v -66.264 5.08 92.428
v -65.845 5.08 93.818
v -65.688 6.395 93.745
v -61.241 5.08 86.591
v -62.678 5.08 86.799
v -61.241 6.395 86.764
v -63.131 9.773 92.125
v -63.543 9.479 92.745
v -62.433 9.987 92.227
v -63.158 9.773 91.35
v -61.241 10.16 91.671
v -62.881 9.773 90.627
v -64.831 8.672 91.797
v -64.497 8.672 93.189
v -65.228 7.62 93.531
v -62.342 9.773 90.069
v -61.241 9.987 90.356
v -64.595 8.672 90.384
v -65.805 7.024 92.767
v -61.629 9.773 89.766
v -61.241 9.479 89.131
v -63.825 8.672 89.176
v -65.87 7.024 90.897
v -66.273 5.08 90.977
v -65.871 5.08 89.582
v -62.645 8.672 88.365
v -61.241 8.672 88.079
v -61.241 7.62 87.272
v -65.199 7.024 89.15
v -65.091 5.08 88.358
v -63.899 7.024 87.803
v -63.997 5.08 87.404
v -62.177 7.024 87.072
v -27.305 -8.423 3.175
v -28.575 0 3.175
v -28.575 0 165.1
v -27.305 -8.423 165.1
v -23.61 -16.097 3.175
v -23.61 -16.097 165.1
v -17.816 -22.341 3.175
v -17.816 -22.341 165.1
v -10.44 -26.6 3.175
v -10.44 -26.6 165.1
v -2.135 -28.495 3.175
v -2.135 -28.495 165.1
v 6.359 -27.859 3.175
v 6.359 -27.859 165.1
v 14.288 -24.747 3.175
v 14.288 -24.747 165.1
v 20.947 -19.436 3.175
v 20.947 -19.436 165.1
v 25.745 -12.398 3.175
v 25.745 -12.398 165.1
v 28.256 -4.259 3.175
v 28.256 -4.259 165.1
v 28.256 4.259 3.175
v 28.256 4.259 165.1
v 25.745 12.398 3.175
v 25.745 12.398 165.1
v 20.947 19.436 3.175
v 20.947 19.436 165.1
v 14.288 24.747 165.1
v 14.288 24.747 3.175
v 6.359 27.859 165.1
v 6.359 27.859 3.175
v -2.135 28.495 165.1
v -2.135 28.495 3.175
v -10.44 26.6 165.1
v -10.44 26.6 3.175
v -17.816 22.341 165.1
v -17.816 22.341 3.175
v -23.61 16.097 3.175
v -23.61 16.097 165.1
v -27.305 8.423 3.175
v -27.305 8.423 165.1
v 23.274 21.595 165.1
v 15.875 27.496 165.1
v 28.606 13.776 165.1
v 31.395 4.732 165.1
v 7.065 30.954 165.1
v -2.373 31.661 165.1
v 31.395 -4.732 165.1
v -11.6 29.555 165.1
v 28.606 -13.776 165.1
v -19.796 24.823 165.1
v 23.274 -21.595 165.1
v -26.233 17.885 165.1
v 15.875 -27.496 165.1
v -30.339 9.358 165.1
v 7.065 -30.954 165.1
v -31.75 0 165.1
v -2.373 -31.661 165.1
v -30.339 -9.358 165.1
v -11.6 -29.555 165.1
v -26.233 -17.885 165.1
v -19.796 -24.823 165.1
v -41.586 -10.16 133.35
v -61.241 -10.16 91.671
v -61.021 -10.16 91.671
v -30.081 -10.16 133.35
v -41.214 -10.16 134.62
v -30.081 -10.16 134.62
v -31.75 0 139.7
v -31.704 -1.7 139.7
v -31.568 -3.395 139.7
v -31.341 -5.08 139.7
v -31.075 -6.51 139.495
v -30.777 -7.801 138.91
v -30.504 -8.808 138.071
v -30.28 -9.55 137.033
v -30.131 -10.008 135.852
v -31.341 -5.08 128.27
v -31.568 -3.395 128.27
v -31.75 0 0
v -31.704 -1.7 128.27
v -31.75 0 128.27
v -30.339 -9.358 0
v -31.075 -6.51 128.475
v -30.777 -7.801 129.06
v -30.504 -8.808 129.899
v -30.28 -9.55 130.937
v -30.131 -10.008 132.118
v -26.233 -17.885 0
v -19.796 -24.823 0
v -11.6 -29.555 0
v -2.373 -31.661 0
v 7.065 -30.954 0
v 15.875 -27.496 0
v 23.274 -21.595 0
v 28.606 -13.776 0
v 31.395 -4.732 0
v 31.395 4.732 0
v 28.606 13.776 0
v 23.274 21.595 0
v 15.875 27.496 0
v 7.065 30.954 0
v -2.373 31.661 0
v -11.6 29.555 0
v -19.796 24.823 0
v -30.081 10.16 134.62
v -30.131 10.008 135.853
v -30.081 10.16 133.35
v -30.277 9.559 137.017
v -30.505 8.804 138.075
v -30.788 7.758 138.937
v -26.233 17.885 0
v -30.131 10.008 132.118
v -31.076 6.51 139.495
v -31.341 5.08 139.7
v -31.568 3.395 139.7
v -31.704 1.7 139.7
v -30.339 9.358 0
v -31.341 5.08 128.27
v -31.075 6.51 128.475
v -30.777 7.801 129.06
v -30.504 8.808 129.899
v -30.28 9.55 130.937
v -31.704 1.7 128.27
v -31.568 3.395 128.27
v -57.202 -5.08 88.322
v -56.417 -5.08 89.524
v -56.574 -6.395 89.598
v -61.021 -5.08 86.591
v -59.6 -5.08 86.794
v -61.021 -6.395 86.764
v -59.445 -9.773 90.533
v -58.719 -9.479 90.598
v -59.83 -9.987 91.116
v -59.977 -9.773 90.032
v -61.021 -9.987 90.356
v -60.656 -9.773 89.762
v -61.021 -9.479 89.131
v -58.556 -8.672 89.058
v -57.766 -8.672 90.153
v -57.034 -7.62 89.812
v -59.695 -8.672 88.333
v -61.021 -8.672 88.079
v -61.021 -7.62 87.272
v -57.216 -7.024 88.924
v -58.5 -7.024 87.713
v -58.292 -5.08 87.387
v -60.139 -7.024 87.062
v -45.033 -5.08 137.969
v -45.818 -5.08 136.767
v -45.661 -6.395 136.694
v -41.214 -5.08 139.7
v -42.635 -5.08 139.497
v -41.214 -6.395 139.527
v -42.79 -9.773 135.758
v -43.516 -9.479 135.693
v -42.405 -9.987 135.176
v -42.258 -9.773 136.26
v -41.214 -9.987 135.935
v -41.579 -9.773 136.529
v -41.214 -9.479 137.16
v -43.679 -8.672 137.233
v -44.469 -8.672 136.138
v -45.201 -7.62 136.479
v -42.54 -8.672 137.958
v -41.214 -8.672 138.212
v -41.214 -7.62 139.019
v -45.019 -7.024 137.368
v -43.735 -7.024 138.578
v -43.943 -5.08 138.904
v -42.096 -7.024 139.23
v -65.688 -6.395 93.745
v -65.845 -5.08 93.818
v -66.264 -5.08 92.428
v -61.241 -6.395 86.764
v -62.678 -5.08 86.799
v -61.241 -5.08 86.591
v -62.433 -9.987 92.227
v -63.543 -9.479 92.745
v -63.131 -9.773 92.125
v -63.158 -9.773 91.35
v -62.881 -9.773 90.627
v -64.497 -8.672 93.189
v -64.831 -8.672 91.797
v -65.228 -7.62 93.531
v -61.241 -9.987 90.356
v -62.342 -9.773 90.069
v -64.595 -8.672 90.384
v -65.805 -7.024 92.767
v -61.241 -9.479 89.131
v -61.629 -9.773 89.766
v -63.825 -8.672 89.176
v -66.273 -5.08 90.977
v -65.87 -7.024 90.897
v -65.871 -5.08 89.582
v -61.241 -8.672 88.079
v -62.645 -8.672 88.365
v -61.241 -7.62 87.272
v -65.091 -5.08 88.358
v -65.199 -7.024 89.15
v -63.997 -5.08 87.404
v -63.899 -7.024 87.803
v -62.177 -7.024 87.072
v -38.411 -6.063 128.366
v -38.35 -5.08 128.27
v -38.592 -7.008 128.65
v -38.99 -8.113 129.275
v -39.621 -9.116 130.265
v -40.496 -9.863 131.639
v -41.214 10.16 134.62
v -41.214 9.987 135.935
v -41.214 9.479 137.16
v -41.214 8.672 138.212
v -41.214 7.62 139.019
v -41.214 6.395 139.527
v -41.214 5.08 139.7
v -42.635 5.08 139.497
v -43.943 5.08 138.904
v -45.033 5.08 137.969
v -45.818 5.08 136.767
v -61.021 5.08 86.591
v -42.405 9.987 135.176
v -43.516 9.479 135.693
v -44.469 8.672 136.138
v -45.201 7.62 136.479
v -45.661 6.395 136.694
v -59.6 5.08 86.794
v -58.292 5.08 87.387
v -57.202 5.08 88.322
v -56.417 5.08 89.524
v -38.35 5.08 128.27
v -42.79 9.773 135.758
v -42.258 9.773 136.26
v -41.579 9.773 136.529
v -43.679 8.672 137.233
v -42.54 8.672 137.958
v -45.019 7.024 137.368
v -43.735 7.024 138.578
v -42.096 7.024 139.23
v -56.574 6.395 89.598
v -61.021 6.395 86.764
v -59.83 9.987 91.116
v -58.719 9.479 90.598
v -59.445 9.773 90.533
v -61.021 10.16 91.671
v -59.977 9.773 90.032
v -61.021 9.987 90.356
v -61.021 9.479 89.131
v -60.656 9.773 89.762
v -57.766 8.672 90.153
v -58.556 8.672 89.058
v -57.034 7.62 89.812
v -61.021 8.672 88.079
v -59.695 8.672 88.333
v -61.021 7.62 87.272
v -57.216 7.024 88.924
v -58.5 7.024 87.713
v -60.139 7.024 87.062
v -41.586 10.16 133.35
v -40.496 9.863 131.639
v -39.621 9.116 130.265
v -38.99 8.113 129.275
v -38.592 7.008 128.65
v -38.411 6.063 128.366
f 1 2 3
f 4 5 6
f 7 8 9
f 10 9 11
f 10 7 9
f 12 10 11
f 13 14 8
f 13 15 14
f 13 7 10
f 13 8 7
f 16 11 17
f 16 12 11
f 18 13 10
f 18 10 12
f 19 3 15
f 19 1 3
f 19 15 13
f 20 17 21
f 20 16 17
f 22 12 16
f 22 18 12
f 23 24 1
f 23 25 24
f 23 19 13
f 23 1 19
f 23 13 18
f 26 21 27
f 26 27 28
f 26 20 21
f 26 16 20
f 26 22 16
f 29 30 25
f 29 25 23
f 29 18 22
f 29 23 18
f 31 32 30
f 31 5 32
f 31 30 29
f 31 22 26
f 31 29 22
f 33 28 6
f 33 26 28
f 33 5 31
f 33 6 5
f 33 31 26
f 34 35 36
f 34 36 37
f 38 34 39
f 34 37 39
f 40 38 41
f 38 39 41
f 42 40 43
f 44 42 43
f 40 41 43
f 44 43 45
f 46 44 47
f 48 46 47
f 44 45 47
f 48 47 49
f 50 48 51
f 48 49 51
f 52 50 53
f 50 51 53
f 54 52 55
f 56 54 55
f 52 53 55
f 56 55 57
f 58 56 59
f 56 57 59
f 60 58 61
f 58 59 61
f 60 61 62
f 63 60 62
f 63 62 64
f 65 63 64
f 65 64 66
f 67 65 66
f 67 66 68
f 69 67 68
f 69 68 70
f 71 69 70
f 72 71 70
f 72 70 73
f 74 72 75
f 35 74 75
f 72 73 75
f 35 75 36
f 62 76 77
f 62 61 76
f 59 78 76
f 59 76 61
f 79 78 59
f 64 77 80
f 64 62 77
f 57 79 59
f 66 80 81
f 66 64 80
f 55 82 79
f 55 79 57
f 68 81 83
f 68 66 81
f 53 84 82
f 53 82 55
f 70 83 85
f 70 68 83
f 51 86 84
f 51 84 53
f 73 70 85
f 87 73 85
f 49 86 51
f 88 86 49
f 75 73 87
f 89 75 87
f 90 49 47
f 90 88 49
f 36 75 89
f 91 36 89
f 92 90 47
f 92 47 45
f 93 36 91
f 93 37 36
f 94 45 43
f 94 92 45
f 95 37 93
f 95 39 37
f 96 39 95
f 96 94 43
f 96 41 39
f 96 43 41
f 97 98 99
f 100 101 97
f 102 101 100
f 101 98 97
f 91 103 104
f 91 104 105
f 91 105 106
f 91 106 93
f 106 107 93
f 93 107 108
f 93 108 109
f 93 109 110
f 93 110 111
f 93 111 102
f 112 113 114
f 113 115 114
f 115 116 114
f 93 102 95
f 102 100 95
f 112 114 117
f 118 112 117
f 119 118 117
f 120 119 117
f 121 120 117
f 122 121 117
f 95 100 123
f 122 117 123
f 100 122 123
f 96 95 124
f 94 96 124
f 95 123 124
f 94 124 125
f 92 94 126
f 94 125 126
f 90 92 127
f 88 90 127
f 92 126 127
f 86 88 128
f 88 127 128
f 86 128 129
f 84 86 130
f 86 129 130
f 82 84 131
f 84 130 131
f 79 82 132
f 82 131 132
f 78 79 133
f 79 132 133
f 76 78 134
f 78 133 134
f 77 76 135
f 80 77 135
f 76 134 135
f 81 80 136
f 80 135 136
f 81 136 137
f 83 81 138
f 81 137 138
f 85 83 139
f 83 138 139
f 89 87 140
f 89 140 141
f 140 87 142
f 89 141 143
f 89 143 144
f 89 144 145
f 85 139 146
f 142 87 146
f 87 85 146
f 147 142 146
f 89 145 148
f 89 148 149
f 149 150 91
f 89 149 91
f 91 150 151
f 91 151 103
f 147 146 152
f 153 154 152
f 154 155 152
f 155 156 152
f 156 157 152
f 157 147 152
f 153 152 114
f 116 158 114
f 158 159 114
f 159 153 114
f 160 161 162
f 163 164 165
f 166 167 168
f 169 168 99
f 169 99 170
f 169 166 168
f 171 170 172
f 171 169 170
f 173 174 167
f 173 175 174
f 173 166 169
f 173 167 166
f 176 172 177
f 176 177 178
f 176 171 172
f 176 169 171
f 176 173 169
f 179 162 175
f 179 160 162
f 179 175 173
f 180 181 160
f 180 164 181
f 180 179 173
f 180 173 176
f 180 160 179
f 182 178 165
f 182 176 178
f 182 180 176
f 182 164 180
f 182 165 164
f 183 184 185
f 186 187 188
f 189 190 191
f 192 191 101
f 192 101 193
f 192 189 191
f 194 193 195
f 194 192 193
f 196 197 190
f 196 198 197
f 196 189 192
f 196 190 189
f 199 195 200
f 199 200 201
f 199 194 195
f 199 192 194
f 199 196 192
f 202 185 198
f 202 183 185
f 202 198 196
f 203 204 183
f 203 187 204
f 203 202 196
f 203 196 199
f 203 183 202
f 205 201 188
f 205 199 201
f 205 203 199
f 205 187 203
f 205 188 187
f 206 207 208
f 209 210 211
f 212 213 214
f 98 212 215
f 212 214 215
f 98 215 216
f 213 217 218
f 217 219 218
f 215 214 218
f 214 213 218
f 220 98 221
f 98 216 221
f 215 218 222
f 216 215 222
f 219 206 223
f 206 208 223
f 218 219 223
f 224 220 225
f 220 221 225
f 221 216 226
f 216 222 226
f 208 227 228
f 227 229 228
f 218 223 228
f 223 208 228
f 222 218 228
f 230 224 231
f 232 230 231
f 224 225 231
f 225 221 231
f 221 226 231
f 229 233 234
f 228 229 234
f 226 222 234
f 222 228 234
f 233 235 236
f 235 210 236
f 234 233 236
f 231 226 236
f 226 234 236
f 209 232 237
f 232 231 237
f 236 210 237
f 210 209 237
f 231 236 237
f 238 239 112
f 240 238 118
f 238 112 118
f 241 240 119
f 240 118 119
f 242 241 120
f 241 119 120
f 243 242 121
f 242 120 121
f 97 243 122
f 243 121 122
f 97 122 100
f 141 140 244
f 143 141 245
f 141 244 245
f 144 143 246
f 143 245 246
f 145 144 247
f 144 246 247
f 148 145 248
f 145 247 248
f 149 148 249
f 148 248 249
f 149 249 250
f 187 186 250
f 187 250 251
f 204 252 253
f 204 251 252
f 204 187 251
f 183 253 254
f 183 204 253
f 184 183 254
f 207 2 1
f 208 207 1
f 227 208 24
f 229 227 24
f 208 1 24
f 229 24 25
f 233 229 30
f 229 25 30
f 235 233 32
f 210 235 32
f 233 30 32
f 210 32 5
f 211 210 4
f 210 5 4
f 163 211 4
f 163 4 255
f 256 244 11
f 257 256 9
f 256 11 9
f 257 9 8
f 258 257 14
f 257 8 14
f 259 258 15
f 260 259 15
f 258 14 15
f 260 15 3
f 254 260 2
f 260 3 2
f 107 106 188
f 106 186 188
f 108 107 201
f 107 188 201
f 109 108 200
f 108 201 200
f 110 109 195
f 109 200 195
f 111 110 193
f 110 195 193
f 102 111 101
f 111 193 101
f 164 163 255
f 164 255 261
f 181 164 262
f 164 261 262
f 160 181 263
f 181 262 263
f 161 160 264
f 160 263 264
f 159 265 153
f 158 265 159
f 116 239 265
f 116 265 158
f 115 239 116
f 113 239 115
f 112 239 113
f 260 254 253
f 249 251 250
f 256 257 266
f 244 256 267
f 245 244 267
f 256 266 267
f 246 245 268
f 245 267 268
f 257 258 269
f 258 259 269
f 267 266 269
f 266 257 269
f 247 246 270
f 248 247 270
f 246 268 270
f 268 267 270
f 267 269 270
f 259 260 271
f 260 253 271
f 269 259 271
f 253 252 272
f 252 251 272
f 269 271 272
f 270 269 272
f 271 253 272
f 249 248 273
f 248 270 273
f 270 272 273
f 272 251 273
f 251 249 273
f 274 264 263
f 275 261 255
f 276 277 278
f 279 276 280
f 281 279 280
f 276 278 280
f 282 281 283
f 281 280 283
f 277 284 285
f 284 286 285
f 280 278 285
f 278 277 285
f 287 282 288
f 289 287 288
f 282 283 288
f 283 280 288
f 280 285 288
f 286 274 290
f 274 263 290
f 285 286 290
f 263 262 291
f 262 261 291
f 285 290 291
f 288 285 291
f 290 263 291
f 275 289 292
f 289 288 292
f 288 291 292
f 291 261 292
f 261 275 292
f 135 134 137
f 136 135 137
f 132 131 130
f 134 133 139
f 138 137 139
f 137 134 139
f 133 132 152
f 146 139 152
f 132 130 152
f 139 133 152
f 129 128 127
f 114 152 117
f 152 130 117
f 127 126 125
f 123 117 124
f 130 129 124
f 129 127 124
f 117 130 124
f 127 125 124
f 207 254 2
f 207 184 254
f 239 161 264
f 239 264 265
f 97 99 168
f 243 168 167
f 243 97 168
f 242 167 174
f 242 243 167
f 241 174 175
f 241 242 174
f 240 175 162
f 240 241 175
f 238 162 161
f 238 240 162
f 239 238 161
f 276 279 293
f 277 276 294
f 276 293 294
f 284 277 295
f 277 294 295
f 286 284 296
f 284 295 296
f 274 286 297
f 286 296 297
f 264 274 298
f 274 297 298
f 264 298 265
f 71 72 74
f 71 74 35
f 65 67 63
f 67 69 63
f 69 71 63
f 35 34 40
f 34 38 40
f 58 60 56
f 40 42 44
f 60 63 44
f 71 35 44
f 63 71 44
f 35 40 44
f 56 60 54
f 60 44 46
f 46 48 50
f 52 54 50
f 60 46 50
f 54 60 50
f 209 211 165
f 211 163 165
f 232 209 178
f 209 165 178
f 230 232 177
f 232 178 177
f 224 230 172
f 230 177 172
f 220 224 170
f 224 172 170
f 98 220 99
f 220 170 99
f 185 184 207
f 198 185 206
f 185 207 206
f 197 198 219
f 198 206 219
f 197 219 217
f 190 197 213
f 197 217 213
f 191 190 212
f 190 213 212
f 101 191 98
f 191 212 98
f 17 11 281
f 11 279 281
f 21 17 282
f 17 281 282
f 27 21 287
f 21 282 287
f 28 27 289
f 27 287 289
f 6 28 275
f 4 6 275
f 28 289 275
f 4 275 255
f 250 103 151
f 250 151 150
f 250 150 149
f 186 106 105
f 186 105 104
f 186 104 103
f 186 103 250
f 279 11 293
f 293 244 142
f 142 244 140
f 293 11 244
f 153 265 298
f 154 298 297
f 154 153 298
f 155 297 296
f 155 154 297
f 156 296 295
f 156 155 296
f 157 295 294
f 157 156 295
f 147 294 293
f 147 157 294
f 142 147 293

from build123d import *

# Parameters (mm, degrees)
F0_W     = 3.175
F0_H     = 25.4
F0_H_2   = 11.43
F2_DEPTH = 10.16
F3_R     = 5.08


with BuildPart() as f1:
    # F0 (on Front) → F1 (revolve)
    with BuildSketch(Plane.XZ):
        Polygon((-31.75, 0), (0, 0), (0, 3.175), (-28.575, 3.175), (-28.575, 128.27), (-31.75, 128.27), align=None)
        with Locations((-30.1625, 152.4)):
            Rectangle(F0_W, F0_H)
        with Locations((-30.1625, 133.985)):
            Rectangle(F0_W, F0_H_2)
    revolve(axis=Axis((0, 0, 1.5875), (0, 0, 1)))

    # F0 (on Front) → F2 (join, symmetric)
    with BuildSketch(Plane.XZ):
        Polygon((-38.349897, 128.27), (-31.75, 128.27), (-31.75, 139.7), (-44.45, 139.7), (-69.215, 86.591286), (-57.785, 86.591286), align=None)
        with Locations((-30.1625, 133.985)):
            Rectangle(F0_W, F0_H_2)
    extrude(amount=F2_DEPTH, both=True)

    # F3
    f3_edges = [f1.edges().sort_by_distance(p)[0] for p in [
        (-56.8325, 10.16, 113.145643),
        (-56.8325, -10.16, 113.145643),
        (-37.265253, -10.16, 139.7),
        (-37.265253, 10.16, 139.7),
        (-44.45, 0, 139.7),
        (-48.067448, -10.16, 107.430643),
        (-48.067448, 10.16, 107.430643),
        (-63.5, -10.16, 86.591286),
        (-63.5, 10.16, 86.591286),
        (-57.785, 0, 86.591286),
        (-69.215, 0, 86.591286),
        (-34.215202, 10.16, 128.27),
        (-34.215202, -10.16, 128.27),
    ]]
    fillet(f3_edges, radius=F3_R)


solid = f1.part
